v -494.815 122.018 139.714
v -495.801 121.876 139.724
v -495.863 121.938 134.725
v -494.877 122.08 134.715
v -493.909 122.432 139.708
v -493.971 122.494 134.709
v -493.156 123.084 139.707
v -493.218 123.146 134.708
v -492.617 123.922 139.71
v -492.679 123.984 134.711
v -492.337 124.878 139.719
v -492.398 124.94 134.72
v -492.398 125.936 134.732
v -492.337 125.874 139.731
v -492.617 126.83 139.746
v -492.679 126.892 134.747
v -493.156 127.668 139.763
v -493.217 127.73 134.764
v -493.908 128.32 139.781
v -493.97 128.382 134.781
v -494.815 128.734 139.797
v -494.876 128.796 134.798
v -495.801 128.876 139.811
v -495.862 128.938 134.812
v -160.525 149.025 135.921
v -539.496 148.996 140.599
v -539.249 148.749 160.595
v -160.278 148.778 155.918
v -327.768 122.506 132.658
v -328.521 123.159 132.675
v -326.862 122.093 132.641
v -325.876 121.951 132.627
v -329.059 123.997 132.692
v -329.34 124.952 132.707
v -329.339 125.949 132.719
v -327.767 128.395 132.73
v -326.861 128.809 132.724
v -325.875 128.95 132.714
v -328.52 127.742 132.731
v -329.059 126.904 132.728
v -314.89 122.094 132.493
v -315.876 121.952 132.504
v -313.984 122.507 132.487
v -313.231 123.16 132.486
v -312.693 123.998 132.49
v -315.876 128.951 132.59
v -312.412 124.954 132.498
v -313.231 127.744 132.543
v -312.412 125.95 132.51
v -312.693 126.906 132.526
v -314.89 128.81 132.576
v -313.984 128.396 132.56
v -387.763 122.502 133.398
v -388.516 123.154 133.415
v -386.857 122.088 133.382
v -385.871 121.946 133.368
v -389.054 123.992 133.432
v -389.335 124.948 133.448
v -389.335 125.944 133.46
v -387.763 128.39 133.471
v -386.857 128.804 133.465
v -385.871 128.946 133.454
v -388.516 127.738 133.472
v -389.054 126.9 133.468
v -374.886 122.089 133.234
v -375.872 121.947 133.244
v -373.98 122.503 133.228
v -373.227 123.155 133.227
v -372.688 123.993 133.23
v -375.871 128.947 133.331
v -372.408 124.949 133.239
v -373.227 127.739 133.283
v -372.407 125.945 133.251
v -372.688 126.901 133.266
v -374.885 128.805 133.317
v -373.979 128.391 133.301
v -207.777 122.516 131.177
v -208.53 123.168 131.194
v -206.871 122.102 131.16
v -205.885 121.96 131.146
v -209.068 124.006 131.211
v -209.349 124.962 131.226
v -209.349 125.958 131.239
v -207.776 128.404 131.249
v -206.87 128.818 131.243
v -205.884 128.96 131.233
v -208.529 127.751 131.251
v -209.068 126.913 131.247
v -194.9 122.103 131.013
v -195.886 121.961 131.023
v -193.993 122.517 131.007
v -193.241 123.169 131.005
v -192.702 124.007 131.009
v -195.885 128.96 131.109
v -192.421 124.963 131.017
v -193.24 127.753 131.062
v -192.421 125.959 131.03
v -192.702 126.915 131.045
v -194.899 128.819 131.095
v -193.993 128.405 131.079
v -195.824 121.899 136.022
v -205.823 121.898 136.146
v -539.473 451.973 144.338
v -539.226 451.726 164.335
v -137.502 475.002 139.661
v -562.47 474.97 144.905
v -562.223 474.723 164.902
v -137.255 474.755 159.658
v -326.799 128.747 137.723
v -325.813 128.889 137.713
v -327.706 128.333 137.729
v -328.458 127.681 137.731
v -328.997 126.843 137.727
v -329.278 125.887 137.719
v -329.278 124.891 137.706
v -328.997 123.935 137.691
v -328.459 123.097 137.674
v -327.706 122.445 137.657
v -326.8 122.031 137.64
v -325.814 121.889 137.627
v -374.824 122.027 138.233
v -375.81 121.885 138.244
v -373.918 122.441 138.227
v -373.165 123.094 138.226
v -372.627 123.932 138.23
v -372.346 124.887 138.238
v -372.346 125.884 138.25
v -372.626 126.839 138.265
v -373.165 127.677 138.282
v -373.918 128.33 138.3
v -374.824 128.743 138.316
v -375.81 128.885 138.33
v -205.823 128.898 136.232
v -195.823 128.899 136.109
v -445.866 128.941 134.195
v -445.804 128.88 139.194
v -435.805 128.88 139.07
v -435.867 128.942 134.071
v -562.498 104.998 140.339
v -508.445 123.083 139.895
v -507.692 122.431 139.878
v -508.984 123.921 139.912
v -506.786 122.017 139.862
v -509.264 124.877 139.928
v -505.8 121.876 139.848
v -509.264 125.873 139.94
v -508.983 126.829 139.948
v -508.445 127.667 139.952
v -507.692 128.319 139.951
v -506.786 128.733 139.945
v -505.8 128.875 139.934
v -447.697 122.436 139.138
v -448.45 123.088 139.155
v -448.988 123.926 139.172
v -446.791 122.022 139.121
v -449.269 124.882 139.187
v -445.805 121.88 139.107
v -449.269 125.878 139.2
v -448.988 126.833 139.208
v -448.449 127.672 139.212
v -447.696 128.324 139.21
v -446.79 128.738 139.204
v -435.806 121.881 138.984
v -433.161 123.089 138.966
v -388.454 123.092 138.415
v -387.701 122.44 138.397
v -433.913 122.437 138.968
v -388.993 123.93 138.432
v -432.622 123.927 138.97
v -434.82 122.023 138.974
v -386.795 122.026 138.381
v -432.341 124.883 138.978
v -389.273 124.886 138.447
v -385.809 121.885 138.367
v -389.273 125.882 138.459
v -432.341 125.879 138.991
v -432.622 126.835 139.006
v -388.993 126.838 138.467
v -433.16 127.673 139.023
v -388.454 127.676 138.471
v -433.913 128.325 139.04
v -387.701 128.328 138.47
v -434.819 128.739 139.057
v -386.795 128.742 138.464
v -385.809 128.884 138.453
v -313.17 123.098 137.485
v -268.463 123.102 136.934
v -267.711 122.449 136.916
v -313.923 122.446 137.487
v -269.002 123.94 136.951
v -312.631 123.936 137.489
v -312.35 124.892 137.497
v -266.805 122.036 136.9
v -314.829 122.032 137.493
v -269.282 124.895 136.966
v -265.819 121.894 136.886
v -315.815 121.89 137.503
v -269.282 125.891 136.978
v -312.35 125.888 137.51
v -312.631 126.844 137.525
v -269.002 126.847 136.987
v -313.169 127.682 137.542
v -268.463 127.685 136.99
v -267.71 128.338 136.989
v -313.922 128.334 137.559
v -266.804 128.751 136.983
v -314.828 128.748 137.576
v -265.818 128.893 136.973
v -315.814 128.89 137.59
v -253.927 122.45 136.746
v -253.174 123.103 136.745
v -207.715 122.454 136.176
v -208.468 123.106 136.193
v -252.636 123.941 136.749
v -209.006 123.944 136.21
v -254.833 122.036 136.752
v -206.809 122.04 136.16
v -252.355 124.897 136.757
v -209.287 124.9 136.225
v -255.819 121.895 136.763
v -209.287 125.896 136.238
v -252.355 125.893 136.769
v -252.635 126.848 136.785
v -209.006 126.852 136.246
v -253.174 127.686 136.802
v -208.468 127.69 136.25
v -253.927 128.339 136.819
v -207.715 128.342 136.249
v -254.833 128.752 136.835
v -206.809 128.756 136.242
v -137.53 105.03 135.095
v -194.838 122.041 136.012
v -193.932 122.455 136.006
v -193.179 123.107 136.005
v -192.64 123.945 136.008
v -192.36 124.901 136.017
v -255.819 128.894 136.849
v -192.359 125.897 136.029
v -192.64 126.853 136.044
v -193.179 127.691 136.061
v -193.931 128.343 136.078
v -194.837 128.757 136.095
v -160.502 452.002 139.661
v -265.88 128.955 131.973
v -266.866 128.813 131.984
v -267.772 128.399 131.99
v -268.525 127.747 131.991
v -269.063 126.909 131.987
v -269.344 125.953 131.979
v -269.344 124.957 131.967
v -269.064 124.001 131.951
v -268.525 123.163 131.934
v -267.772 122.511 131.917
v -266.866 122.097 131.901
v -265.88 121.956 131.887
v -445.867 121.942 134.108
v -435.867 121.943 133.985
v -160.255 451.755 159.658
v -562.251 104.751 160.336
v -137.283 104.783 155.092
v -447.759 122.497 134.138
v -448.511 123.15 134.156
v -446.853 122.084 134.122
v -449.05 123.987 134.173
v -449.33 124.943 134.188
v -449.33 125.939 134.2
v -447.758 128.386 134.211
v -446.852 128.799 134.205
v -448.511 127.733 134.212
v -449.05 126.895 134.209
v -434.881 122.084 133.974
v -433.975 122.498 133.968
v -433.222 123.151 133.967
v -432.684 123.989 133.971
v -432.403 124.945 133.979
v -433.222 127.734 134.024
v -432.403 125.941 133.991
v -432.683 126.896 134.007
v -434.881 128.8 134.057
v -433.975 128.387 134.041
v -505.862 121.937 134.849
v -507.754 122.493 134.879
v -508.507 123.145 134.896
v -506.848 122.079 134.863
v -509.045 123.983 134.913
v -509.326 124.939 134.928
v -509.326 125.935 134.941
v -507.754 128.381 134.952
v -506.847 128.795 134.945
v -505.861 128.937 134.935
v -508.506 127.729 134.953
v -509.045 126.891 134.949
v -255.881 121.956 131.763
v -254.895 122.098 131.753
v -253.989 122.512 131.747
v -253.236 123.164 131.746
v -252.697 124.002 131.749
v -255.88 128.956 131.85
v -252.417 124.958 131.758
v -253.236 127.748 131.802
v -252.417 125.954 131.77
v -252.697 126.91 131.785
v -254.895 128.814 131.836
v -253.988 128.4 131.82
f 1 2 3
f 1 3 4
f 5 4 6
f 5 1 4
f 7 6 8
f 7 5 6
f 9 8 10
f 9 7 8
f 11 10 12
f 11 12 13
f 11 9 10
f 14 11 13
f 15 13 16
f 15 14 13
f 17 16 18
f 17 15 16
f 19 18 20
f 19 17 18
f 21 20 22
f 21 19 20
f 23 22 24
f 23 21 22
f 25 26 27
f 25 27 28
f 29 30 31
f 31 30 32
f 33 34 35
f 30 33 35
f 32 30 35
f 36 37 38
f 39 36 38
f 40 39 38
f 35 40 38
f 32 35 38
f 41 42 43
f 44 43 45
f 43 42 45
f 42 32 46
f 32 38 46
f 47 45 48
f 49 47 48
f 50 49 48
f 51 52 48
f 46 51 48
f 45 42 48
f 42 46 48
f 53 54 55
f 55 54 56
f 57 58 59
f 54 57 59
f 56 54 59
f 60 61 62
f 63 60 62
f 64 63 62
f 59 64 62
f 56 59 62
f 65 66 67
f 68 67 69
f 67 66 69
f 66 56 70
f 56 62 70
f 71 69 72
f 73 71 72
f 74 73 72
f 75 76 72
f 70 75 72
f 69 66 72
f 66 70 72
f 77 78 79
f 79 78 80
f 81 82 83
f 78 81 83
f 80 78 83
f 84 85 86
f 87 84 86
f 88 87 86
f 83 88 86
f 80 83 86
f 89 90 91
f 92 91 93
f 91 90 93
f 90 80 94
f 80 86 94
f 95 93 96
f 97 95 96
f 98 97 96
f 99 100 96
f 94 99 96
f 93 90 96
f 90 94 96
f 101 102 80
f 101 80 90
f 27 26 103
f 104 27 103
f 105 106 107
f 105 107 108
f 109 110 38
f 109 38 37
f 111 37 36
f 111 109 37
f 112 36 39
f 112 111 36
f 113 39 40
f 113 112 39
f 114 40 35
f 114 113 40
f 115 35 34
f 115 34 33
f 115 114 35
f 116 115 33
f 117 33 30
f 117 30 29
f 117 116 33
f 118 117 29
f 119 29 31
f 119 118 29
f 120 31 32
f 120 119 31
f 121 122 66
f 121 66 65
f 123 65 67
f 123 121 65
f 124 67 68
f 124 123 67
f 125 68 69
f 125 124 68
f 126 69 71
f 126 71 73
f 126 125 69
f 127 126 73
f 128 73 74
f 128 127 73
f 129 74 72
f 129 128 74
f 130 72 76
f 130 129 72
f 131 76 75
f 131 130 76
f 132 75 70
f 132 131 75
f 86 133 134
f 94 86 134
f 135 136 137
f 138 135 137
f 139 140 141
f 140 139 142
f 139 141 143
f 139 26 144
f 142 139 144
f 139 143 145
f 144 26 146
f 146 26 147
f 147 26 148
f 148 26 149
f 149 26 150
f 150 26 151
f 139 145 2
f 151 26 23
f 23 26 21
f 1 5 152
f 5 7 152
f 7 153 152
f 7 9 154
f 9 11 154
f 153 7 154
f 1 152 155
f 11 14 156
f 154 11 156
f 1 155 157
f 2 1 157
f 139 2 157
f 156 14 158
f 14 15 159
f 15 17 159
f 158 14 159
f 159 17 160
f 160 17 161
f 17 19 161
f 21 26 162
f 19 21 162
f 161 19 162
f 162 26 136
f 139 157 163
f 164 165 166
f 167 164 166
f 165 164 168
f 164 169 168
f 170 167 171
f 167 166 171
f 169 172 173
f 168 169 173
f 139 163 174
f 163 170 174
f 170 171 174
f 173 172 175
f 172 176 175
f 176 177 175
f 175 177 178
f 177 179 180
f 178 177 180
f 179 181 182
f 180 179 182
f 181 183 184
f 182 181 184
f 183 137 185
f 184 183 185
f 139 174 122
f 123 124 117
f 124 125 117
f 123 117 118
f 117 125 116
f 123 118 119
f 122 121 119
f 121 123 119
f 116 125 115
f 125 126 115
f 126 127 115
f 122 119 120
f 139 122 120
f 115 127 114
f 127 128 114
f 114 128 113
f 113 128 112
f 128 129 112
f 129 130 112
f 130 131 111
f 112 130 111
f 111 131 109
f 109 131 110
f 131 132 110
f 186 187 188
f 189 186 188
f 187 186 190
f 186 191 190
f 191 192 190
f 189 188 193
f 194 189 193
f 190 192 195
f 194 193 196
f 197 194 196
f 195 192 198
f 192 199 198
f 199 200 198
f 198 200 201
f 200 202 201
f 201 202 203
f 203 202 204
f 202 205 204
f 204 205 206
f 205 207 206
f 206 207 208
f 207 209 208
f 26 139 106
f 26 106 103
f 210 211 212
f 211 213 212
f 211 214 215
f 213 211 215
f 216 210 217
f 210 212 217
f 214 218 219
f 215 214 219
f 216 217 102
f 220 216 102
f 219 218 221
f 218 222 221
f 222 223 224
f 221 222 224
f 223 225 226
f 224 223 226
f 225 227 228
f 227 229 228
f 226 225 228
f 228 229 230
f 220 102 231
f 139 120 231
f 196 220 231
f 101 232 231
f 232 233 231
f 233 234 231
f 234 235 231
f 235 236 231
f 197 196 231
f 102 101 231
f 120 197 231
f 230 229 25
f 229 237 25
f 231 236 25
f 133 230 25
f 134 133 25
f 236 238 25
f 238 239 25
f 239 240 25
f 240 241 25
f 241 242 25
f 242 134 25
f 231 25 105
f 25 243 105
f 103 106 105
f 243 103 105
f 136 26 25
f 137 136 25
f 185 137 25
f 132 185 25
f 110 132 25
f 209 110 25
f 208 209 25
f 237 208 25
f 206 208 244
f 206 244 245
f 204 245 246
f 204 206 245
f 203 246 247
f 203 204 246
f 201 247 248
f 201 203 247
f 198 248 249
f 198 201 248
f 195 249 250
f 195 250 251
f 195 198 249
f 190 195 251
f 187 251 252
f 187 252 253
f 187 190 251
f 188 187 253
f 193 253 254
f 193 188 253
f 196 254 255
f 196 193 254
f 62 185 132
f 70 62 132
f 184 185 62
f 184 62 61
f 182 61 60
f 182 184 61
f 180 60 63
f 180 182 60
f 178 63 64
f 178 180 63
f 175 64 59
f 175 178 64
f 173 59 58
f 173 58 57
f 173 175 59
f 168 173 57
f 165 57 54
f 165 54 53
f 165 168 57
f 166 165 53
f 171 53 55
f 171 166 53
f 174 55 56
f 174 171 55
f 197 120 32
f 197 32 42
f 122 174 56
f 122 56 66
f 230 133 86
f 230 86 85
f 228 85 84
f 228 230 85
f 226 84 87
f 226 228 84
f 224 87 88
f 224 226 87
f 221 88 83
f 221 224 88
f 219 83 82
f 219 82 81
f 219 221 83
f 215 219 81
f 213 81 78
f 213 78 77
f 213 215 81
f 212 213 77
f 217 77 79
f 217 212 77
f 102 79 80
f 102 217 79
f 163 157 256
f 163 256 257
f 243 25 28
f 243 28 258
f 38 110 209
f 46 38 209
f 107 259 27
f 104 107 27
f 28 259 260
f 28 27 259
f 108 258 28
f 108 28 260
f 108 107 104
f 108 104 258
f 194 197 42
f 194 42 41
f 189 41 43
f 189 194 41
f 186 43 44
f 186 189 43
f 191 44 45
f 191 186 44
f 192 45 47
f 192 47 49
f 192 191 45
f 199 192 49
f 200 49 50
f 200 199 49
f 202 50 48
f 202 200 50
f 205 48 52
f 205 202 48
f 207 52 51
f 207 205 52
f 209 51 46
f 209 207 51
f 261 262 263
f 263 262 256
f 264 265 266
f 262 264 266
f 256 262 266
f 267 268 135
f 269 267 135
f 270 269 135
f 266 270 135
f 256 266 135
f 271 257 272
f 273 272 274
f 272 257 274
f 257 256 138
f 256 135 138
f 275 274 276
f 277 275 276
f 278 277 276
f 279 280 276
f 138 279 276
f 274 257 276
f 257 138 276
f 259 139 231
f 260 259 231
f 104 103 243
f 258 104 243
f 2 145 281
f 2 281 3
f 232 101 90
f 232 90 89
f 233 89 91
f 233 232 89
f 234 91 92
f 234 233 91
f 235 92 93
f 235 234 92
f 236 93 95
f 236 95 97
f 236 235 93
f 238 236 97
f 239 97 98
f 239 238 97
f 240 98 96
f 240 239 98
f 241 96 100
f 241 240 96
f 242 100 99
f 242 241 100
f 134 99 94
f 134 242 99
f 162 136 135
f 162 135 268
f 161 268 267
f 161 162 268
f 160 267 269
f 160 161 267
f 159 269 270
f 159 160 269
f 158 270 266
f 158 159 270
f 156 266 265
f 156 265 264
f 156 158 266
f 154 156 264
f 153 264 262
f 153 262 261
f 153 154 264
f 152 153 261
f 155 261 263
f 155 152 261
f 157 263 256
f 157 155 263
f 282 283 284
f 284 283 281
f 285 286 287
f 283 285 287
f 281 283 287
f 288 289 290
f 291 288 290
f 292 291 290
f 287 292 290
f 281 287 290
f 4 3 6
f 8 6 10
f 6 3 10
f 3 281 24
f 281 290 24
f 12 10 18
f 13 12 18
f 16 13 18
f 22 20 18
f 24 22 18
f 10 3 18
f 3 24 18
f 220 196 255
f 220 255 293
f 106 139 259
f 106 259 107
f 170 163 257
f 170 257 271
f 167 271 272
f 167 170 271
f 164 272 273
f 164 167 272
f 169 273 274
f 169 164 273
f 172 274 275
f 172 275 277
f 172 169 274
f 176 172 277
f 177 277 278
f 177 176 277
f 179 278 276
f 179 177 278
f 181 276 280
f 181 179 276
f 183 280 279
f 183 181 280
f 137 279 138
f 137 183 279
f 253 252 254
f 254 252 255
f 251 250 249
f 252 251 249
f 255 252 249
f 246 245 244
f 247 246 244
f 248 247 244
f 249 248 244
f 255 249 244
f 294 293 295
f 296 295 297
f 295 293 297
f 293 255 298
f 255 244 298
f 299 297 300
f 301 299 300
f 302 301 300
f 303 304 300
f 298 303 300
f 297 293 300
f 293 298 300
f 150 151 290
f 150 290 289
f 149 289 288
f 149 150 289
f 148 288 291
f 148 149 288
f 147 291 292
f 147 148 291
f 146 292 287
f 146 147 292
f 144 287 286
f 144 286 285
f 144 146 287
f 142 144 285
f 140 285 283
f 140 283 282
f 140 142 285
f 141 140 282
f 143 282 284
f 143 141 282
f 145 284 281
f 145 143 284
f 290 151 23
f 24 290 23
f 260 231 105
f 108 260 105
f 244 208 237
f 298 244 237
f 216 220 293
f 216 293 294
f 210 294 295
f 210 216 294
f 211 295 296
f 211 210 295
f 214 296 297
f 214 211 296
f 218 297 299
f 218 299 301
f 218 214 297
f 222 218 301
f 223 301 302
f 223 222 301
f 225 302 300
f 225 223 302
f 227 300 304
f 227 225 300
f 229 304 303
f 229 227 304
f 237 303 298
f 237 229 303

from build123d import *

# Parameters (mm, degrees)
SKETCH007_W             = 425
SKETCH007_H             = 370
SKETCH007_W_2           = 379
SKETCH007_H_2           = 303
PAD003_DEPTH            = 20
PAD004_DEPTH            = 5
LINEARPATTERN001_COUNT  = 6
LINEARPATTERN001_PITCH  = 60
BODY001_ROLL_ANGLE      = 0.707143
BODY001_PITCH_ANGLE     = 0.707089
BODY001_PLACEMENT_ANGLE = 0.004364


with BuildPart() as part:
    # Sketch007 → Pad003 (new body)
    with BuildSketch(Plane.XY):
        Rectangle(SKETCH007_W, SKETCH007_H)
        with Locations((0, 10.5)):
            Rectangle(SKETCH007_W_2, SKETCH007_H_2, mode=Mode.SUBTRACT)
    extrude(amount=PAD003_DEPTH)

    # Sketch008 → Pad004 (join)
    with BuildSketch(Plane.XY):
        with BuildLine():
            ThreePointArc((-155.799344, -161.125363), (-159.299344, -164.625363), (-155.799344, -168.125363))
            Line((-155.799344, -168.125363), (-145.799344, -168.125363))
            ThreePointArc((-145.799344, -168.125363), (-142.299344, -164.625363), (-145.799344, -161.125363))
            Line((-155.799344, -161.125363), (-145.799344, -161.125363))
        make_face()
    pad004 = extrude(amount=-PAD004_DEPTH)

    # LinearPattern001: Pad004 ×6
    with Locations(*[(i * LINEARPATTERN001_PITCH, 0, 0) for i in range(1, LINEARPATTERN001_COUNT)]):
        add(pad004)


with BuildPart() as part_1:
    # Body001 roll: moved
    add(part.part.rotate(Axis((0, 0, 0), (1, 0, 0)), BODY001_ROLL_ANGLE))


with BuildPart() as part_2:
    # Body001 pitch: moved
    add(part_1.part.rotate(Axis((0, 0, 0), (0, 1, 0)), BODY001_PITCH_ANGLE))


with BuildPart() as part_3:
    # Body001 placement: moved
    add(part_2.part.moved(Location((-350, 290, 140))).rotate(Axis((-350, 290, 140), (0, 0, 1)), BODY001_PLACEMENT_ANGLE))


solid = part_3.part
